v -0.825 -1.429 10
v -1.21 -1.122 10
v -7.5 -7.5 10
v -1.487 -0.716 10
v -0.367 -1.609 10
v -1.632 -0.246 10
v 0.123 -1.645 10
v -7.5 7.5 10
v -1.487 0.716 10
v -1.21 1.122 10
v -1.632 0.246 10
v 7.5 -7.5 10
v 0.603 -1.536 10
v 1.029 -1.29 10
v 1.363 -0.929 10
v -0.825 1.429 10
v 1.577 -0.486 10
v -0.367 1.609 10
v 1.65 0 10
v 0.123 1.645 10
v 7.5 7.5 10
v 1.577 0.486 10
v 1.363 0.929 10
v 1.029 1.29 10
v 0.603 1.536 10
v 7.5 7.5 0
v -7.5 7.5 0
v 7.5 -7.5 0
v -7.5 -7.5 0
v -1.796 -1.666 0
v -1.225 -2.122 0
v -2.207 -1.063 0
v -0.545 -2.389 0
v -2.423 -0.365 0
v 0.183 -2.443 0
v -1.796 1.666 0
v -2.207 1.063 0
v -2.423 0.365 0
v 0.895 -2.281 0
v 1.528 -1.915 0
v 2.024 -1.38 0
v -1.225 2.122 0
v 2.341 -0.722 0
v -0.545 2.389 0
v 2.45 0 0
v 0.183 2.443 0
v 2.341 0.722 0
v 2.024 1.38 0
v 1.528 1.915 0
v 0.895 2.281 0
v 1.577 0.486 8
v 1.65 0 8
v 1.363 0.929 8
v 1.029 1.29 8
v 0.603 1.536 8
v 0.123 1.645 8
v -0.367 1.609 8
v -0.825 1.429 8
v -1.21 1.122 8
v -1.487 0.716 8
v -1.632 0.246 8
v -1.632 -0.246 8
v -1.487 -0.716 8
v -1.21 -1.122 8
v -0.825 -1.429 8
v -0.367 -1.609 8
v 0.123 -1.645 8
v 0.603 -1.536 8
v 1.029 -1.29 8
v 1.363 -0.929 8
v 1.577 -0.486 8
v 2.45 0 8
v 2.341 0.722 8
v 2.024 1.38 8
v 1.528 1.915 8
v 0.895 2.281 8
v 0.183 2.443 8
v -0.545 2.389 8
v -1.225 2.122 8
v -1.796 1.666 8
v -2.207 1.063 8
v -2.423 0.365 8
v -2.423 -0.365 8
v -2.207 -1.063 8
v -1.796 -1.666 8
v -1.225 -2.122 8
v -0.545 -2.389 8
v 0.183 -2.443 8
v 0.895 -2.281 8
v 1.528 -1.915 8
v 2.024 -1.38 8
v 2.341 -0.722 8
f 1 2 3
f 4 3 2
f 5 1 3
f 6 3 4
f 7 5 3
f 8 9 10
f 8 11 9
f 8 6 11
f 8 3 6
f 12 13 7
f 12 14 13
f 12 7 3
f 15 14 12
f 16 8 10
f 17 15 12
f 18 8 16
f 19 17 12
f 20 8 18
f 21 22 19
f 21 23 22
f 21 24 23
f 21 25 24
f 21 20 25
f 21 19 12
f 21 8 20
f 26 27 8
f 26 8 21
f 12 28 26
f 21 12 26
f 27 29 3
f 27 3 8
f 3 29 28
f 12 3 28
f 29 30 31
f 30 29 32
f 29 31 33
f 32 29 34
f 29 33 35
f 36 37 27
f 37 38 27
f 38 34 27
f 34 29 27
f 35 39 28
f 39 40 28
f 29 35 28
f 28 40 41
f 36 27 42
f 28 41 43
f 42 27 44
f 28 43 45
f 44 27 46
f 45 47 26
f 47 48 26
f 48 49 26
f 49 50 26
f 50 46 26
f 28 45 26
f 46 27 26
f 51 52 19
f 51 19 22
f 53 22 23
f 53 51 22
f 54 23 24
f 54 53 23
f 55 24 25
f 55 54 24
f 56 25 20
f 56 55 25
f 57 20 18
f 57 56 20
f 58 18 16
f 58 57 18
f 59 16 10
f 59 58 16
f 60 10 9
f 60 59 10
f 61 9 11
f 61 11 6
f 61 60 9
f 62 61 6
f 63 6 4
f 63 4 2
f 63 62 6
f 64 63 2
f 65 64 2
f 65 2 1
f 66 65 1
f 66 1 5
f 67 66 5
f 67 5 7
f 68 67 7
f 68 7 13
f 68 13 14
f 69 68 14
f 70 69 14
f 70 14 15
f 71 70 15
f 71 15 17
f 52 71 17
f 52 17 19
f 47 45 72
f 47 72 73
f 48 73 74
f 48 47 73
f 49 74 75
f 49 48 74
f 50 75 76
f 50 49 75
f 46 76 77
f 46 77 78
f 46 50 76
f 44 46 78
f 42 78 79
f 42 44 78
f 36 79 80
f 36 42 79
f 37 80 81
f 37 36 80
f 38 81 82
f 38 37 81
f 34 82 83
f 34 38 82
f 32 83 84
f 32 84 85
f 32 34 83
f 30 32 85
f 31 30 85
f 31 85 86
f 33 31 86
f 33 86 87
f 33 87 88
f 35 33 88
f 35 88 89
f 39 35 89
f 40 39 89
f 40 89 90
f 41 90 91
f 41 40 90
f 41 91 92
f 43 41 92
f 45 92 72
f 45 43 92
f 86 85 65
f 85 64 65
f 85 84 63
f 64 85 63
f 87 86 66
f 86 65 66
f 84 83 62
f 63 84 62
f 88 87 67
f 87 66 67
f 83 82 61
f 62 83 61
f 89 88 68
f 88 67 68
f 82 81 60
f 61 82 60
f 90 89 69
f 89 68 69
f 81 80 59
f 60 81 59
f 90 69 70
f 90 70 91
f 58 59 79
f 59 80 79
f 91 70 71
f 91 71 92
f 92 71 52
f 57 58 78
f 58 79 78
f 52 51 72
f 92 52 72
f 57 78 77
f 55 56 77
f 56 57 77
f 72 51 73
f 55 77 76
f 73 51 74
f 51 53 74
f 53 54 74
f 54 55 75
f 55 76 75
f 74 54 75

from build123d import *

# Parameters (mm, degrees)
SKETCH1_W           = 15
SKETCH1_H           = 15
SKETCH1_R           = 1.65
BOSS_EXTRUDE4_DEPTH = 10
SKETCH1_9_R         = 2.45
SKETCH1_9_R_2       = 1.65
CUT_EXTRUDE3_DEPTH  = 8


with BuildPart() as part:
    # Sketch1 → Boss-Extrude4 (new body)
    with BuildSketch(Plane.XY):
        Rectangle(SKETCH1_W, SKETCH1_H)
        Circle(SKETCH1_R, mode=Mode.SUBTRACT)
    extrude(amount=BOSS_EXTRUDE4_DEPTH)

    # Sketch1<9> → Cut-Extrude3 (cut)
    with BuildSketch(Plane.XY):
        Circle(SKETCH1_9_R)
        Circle(SKETCH1_9_R_2, mode=Mode.SUBTRACT)
    extrude(amount=CUT_EXTRUDE3_DEPTH, mode=Mode.SUBTRACT)


solid = part.part
